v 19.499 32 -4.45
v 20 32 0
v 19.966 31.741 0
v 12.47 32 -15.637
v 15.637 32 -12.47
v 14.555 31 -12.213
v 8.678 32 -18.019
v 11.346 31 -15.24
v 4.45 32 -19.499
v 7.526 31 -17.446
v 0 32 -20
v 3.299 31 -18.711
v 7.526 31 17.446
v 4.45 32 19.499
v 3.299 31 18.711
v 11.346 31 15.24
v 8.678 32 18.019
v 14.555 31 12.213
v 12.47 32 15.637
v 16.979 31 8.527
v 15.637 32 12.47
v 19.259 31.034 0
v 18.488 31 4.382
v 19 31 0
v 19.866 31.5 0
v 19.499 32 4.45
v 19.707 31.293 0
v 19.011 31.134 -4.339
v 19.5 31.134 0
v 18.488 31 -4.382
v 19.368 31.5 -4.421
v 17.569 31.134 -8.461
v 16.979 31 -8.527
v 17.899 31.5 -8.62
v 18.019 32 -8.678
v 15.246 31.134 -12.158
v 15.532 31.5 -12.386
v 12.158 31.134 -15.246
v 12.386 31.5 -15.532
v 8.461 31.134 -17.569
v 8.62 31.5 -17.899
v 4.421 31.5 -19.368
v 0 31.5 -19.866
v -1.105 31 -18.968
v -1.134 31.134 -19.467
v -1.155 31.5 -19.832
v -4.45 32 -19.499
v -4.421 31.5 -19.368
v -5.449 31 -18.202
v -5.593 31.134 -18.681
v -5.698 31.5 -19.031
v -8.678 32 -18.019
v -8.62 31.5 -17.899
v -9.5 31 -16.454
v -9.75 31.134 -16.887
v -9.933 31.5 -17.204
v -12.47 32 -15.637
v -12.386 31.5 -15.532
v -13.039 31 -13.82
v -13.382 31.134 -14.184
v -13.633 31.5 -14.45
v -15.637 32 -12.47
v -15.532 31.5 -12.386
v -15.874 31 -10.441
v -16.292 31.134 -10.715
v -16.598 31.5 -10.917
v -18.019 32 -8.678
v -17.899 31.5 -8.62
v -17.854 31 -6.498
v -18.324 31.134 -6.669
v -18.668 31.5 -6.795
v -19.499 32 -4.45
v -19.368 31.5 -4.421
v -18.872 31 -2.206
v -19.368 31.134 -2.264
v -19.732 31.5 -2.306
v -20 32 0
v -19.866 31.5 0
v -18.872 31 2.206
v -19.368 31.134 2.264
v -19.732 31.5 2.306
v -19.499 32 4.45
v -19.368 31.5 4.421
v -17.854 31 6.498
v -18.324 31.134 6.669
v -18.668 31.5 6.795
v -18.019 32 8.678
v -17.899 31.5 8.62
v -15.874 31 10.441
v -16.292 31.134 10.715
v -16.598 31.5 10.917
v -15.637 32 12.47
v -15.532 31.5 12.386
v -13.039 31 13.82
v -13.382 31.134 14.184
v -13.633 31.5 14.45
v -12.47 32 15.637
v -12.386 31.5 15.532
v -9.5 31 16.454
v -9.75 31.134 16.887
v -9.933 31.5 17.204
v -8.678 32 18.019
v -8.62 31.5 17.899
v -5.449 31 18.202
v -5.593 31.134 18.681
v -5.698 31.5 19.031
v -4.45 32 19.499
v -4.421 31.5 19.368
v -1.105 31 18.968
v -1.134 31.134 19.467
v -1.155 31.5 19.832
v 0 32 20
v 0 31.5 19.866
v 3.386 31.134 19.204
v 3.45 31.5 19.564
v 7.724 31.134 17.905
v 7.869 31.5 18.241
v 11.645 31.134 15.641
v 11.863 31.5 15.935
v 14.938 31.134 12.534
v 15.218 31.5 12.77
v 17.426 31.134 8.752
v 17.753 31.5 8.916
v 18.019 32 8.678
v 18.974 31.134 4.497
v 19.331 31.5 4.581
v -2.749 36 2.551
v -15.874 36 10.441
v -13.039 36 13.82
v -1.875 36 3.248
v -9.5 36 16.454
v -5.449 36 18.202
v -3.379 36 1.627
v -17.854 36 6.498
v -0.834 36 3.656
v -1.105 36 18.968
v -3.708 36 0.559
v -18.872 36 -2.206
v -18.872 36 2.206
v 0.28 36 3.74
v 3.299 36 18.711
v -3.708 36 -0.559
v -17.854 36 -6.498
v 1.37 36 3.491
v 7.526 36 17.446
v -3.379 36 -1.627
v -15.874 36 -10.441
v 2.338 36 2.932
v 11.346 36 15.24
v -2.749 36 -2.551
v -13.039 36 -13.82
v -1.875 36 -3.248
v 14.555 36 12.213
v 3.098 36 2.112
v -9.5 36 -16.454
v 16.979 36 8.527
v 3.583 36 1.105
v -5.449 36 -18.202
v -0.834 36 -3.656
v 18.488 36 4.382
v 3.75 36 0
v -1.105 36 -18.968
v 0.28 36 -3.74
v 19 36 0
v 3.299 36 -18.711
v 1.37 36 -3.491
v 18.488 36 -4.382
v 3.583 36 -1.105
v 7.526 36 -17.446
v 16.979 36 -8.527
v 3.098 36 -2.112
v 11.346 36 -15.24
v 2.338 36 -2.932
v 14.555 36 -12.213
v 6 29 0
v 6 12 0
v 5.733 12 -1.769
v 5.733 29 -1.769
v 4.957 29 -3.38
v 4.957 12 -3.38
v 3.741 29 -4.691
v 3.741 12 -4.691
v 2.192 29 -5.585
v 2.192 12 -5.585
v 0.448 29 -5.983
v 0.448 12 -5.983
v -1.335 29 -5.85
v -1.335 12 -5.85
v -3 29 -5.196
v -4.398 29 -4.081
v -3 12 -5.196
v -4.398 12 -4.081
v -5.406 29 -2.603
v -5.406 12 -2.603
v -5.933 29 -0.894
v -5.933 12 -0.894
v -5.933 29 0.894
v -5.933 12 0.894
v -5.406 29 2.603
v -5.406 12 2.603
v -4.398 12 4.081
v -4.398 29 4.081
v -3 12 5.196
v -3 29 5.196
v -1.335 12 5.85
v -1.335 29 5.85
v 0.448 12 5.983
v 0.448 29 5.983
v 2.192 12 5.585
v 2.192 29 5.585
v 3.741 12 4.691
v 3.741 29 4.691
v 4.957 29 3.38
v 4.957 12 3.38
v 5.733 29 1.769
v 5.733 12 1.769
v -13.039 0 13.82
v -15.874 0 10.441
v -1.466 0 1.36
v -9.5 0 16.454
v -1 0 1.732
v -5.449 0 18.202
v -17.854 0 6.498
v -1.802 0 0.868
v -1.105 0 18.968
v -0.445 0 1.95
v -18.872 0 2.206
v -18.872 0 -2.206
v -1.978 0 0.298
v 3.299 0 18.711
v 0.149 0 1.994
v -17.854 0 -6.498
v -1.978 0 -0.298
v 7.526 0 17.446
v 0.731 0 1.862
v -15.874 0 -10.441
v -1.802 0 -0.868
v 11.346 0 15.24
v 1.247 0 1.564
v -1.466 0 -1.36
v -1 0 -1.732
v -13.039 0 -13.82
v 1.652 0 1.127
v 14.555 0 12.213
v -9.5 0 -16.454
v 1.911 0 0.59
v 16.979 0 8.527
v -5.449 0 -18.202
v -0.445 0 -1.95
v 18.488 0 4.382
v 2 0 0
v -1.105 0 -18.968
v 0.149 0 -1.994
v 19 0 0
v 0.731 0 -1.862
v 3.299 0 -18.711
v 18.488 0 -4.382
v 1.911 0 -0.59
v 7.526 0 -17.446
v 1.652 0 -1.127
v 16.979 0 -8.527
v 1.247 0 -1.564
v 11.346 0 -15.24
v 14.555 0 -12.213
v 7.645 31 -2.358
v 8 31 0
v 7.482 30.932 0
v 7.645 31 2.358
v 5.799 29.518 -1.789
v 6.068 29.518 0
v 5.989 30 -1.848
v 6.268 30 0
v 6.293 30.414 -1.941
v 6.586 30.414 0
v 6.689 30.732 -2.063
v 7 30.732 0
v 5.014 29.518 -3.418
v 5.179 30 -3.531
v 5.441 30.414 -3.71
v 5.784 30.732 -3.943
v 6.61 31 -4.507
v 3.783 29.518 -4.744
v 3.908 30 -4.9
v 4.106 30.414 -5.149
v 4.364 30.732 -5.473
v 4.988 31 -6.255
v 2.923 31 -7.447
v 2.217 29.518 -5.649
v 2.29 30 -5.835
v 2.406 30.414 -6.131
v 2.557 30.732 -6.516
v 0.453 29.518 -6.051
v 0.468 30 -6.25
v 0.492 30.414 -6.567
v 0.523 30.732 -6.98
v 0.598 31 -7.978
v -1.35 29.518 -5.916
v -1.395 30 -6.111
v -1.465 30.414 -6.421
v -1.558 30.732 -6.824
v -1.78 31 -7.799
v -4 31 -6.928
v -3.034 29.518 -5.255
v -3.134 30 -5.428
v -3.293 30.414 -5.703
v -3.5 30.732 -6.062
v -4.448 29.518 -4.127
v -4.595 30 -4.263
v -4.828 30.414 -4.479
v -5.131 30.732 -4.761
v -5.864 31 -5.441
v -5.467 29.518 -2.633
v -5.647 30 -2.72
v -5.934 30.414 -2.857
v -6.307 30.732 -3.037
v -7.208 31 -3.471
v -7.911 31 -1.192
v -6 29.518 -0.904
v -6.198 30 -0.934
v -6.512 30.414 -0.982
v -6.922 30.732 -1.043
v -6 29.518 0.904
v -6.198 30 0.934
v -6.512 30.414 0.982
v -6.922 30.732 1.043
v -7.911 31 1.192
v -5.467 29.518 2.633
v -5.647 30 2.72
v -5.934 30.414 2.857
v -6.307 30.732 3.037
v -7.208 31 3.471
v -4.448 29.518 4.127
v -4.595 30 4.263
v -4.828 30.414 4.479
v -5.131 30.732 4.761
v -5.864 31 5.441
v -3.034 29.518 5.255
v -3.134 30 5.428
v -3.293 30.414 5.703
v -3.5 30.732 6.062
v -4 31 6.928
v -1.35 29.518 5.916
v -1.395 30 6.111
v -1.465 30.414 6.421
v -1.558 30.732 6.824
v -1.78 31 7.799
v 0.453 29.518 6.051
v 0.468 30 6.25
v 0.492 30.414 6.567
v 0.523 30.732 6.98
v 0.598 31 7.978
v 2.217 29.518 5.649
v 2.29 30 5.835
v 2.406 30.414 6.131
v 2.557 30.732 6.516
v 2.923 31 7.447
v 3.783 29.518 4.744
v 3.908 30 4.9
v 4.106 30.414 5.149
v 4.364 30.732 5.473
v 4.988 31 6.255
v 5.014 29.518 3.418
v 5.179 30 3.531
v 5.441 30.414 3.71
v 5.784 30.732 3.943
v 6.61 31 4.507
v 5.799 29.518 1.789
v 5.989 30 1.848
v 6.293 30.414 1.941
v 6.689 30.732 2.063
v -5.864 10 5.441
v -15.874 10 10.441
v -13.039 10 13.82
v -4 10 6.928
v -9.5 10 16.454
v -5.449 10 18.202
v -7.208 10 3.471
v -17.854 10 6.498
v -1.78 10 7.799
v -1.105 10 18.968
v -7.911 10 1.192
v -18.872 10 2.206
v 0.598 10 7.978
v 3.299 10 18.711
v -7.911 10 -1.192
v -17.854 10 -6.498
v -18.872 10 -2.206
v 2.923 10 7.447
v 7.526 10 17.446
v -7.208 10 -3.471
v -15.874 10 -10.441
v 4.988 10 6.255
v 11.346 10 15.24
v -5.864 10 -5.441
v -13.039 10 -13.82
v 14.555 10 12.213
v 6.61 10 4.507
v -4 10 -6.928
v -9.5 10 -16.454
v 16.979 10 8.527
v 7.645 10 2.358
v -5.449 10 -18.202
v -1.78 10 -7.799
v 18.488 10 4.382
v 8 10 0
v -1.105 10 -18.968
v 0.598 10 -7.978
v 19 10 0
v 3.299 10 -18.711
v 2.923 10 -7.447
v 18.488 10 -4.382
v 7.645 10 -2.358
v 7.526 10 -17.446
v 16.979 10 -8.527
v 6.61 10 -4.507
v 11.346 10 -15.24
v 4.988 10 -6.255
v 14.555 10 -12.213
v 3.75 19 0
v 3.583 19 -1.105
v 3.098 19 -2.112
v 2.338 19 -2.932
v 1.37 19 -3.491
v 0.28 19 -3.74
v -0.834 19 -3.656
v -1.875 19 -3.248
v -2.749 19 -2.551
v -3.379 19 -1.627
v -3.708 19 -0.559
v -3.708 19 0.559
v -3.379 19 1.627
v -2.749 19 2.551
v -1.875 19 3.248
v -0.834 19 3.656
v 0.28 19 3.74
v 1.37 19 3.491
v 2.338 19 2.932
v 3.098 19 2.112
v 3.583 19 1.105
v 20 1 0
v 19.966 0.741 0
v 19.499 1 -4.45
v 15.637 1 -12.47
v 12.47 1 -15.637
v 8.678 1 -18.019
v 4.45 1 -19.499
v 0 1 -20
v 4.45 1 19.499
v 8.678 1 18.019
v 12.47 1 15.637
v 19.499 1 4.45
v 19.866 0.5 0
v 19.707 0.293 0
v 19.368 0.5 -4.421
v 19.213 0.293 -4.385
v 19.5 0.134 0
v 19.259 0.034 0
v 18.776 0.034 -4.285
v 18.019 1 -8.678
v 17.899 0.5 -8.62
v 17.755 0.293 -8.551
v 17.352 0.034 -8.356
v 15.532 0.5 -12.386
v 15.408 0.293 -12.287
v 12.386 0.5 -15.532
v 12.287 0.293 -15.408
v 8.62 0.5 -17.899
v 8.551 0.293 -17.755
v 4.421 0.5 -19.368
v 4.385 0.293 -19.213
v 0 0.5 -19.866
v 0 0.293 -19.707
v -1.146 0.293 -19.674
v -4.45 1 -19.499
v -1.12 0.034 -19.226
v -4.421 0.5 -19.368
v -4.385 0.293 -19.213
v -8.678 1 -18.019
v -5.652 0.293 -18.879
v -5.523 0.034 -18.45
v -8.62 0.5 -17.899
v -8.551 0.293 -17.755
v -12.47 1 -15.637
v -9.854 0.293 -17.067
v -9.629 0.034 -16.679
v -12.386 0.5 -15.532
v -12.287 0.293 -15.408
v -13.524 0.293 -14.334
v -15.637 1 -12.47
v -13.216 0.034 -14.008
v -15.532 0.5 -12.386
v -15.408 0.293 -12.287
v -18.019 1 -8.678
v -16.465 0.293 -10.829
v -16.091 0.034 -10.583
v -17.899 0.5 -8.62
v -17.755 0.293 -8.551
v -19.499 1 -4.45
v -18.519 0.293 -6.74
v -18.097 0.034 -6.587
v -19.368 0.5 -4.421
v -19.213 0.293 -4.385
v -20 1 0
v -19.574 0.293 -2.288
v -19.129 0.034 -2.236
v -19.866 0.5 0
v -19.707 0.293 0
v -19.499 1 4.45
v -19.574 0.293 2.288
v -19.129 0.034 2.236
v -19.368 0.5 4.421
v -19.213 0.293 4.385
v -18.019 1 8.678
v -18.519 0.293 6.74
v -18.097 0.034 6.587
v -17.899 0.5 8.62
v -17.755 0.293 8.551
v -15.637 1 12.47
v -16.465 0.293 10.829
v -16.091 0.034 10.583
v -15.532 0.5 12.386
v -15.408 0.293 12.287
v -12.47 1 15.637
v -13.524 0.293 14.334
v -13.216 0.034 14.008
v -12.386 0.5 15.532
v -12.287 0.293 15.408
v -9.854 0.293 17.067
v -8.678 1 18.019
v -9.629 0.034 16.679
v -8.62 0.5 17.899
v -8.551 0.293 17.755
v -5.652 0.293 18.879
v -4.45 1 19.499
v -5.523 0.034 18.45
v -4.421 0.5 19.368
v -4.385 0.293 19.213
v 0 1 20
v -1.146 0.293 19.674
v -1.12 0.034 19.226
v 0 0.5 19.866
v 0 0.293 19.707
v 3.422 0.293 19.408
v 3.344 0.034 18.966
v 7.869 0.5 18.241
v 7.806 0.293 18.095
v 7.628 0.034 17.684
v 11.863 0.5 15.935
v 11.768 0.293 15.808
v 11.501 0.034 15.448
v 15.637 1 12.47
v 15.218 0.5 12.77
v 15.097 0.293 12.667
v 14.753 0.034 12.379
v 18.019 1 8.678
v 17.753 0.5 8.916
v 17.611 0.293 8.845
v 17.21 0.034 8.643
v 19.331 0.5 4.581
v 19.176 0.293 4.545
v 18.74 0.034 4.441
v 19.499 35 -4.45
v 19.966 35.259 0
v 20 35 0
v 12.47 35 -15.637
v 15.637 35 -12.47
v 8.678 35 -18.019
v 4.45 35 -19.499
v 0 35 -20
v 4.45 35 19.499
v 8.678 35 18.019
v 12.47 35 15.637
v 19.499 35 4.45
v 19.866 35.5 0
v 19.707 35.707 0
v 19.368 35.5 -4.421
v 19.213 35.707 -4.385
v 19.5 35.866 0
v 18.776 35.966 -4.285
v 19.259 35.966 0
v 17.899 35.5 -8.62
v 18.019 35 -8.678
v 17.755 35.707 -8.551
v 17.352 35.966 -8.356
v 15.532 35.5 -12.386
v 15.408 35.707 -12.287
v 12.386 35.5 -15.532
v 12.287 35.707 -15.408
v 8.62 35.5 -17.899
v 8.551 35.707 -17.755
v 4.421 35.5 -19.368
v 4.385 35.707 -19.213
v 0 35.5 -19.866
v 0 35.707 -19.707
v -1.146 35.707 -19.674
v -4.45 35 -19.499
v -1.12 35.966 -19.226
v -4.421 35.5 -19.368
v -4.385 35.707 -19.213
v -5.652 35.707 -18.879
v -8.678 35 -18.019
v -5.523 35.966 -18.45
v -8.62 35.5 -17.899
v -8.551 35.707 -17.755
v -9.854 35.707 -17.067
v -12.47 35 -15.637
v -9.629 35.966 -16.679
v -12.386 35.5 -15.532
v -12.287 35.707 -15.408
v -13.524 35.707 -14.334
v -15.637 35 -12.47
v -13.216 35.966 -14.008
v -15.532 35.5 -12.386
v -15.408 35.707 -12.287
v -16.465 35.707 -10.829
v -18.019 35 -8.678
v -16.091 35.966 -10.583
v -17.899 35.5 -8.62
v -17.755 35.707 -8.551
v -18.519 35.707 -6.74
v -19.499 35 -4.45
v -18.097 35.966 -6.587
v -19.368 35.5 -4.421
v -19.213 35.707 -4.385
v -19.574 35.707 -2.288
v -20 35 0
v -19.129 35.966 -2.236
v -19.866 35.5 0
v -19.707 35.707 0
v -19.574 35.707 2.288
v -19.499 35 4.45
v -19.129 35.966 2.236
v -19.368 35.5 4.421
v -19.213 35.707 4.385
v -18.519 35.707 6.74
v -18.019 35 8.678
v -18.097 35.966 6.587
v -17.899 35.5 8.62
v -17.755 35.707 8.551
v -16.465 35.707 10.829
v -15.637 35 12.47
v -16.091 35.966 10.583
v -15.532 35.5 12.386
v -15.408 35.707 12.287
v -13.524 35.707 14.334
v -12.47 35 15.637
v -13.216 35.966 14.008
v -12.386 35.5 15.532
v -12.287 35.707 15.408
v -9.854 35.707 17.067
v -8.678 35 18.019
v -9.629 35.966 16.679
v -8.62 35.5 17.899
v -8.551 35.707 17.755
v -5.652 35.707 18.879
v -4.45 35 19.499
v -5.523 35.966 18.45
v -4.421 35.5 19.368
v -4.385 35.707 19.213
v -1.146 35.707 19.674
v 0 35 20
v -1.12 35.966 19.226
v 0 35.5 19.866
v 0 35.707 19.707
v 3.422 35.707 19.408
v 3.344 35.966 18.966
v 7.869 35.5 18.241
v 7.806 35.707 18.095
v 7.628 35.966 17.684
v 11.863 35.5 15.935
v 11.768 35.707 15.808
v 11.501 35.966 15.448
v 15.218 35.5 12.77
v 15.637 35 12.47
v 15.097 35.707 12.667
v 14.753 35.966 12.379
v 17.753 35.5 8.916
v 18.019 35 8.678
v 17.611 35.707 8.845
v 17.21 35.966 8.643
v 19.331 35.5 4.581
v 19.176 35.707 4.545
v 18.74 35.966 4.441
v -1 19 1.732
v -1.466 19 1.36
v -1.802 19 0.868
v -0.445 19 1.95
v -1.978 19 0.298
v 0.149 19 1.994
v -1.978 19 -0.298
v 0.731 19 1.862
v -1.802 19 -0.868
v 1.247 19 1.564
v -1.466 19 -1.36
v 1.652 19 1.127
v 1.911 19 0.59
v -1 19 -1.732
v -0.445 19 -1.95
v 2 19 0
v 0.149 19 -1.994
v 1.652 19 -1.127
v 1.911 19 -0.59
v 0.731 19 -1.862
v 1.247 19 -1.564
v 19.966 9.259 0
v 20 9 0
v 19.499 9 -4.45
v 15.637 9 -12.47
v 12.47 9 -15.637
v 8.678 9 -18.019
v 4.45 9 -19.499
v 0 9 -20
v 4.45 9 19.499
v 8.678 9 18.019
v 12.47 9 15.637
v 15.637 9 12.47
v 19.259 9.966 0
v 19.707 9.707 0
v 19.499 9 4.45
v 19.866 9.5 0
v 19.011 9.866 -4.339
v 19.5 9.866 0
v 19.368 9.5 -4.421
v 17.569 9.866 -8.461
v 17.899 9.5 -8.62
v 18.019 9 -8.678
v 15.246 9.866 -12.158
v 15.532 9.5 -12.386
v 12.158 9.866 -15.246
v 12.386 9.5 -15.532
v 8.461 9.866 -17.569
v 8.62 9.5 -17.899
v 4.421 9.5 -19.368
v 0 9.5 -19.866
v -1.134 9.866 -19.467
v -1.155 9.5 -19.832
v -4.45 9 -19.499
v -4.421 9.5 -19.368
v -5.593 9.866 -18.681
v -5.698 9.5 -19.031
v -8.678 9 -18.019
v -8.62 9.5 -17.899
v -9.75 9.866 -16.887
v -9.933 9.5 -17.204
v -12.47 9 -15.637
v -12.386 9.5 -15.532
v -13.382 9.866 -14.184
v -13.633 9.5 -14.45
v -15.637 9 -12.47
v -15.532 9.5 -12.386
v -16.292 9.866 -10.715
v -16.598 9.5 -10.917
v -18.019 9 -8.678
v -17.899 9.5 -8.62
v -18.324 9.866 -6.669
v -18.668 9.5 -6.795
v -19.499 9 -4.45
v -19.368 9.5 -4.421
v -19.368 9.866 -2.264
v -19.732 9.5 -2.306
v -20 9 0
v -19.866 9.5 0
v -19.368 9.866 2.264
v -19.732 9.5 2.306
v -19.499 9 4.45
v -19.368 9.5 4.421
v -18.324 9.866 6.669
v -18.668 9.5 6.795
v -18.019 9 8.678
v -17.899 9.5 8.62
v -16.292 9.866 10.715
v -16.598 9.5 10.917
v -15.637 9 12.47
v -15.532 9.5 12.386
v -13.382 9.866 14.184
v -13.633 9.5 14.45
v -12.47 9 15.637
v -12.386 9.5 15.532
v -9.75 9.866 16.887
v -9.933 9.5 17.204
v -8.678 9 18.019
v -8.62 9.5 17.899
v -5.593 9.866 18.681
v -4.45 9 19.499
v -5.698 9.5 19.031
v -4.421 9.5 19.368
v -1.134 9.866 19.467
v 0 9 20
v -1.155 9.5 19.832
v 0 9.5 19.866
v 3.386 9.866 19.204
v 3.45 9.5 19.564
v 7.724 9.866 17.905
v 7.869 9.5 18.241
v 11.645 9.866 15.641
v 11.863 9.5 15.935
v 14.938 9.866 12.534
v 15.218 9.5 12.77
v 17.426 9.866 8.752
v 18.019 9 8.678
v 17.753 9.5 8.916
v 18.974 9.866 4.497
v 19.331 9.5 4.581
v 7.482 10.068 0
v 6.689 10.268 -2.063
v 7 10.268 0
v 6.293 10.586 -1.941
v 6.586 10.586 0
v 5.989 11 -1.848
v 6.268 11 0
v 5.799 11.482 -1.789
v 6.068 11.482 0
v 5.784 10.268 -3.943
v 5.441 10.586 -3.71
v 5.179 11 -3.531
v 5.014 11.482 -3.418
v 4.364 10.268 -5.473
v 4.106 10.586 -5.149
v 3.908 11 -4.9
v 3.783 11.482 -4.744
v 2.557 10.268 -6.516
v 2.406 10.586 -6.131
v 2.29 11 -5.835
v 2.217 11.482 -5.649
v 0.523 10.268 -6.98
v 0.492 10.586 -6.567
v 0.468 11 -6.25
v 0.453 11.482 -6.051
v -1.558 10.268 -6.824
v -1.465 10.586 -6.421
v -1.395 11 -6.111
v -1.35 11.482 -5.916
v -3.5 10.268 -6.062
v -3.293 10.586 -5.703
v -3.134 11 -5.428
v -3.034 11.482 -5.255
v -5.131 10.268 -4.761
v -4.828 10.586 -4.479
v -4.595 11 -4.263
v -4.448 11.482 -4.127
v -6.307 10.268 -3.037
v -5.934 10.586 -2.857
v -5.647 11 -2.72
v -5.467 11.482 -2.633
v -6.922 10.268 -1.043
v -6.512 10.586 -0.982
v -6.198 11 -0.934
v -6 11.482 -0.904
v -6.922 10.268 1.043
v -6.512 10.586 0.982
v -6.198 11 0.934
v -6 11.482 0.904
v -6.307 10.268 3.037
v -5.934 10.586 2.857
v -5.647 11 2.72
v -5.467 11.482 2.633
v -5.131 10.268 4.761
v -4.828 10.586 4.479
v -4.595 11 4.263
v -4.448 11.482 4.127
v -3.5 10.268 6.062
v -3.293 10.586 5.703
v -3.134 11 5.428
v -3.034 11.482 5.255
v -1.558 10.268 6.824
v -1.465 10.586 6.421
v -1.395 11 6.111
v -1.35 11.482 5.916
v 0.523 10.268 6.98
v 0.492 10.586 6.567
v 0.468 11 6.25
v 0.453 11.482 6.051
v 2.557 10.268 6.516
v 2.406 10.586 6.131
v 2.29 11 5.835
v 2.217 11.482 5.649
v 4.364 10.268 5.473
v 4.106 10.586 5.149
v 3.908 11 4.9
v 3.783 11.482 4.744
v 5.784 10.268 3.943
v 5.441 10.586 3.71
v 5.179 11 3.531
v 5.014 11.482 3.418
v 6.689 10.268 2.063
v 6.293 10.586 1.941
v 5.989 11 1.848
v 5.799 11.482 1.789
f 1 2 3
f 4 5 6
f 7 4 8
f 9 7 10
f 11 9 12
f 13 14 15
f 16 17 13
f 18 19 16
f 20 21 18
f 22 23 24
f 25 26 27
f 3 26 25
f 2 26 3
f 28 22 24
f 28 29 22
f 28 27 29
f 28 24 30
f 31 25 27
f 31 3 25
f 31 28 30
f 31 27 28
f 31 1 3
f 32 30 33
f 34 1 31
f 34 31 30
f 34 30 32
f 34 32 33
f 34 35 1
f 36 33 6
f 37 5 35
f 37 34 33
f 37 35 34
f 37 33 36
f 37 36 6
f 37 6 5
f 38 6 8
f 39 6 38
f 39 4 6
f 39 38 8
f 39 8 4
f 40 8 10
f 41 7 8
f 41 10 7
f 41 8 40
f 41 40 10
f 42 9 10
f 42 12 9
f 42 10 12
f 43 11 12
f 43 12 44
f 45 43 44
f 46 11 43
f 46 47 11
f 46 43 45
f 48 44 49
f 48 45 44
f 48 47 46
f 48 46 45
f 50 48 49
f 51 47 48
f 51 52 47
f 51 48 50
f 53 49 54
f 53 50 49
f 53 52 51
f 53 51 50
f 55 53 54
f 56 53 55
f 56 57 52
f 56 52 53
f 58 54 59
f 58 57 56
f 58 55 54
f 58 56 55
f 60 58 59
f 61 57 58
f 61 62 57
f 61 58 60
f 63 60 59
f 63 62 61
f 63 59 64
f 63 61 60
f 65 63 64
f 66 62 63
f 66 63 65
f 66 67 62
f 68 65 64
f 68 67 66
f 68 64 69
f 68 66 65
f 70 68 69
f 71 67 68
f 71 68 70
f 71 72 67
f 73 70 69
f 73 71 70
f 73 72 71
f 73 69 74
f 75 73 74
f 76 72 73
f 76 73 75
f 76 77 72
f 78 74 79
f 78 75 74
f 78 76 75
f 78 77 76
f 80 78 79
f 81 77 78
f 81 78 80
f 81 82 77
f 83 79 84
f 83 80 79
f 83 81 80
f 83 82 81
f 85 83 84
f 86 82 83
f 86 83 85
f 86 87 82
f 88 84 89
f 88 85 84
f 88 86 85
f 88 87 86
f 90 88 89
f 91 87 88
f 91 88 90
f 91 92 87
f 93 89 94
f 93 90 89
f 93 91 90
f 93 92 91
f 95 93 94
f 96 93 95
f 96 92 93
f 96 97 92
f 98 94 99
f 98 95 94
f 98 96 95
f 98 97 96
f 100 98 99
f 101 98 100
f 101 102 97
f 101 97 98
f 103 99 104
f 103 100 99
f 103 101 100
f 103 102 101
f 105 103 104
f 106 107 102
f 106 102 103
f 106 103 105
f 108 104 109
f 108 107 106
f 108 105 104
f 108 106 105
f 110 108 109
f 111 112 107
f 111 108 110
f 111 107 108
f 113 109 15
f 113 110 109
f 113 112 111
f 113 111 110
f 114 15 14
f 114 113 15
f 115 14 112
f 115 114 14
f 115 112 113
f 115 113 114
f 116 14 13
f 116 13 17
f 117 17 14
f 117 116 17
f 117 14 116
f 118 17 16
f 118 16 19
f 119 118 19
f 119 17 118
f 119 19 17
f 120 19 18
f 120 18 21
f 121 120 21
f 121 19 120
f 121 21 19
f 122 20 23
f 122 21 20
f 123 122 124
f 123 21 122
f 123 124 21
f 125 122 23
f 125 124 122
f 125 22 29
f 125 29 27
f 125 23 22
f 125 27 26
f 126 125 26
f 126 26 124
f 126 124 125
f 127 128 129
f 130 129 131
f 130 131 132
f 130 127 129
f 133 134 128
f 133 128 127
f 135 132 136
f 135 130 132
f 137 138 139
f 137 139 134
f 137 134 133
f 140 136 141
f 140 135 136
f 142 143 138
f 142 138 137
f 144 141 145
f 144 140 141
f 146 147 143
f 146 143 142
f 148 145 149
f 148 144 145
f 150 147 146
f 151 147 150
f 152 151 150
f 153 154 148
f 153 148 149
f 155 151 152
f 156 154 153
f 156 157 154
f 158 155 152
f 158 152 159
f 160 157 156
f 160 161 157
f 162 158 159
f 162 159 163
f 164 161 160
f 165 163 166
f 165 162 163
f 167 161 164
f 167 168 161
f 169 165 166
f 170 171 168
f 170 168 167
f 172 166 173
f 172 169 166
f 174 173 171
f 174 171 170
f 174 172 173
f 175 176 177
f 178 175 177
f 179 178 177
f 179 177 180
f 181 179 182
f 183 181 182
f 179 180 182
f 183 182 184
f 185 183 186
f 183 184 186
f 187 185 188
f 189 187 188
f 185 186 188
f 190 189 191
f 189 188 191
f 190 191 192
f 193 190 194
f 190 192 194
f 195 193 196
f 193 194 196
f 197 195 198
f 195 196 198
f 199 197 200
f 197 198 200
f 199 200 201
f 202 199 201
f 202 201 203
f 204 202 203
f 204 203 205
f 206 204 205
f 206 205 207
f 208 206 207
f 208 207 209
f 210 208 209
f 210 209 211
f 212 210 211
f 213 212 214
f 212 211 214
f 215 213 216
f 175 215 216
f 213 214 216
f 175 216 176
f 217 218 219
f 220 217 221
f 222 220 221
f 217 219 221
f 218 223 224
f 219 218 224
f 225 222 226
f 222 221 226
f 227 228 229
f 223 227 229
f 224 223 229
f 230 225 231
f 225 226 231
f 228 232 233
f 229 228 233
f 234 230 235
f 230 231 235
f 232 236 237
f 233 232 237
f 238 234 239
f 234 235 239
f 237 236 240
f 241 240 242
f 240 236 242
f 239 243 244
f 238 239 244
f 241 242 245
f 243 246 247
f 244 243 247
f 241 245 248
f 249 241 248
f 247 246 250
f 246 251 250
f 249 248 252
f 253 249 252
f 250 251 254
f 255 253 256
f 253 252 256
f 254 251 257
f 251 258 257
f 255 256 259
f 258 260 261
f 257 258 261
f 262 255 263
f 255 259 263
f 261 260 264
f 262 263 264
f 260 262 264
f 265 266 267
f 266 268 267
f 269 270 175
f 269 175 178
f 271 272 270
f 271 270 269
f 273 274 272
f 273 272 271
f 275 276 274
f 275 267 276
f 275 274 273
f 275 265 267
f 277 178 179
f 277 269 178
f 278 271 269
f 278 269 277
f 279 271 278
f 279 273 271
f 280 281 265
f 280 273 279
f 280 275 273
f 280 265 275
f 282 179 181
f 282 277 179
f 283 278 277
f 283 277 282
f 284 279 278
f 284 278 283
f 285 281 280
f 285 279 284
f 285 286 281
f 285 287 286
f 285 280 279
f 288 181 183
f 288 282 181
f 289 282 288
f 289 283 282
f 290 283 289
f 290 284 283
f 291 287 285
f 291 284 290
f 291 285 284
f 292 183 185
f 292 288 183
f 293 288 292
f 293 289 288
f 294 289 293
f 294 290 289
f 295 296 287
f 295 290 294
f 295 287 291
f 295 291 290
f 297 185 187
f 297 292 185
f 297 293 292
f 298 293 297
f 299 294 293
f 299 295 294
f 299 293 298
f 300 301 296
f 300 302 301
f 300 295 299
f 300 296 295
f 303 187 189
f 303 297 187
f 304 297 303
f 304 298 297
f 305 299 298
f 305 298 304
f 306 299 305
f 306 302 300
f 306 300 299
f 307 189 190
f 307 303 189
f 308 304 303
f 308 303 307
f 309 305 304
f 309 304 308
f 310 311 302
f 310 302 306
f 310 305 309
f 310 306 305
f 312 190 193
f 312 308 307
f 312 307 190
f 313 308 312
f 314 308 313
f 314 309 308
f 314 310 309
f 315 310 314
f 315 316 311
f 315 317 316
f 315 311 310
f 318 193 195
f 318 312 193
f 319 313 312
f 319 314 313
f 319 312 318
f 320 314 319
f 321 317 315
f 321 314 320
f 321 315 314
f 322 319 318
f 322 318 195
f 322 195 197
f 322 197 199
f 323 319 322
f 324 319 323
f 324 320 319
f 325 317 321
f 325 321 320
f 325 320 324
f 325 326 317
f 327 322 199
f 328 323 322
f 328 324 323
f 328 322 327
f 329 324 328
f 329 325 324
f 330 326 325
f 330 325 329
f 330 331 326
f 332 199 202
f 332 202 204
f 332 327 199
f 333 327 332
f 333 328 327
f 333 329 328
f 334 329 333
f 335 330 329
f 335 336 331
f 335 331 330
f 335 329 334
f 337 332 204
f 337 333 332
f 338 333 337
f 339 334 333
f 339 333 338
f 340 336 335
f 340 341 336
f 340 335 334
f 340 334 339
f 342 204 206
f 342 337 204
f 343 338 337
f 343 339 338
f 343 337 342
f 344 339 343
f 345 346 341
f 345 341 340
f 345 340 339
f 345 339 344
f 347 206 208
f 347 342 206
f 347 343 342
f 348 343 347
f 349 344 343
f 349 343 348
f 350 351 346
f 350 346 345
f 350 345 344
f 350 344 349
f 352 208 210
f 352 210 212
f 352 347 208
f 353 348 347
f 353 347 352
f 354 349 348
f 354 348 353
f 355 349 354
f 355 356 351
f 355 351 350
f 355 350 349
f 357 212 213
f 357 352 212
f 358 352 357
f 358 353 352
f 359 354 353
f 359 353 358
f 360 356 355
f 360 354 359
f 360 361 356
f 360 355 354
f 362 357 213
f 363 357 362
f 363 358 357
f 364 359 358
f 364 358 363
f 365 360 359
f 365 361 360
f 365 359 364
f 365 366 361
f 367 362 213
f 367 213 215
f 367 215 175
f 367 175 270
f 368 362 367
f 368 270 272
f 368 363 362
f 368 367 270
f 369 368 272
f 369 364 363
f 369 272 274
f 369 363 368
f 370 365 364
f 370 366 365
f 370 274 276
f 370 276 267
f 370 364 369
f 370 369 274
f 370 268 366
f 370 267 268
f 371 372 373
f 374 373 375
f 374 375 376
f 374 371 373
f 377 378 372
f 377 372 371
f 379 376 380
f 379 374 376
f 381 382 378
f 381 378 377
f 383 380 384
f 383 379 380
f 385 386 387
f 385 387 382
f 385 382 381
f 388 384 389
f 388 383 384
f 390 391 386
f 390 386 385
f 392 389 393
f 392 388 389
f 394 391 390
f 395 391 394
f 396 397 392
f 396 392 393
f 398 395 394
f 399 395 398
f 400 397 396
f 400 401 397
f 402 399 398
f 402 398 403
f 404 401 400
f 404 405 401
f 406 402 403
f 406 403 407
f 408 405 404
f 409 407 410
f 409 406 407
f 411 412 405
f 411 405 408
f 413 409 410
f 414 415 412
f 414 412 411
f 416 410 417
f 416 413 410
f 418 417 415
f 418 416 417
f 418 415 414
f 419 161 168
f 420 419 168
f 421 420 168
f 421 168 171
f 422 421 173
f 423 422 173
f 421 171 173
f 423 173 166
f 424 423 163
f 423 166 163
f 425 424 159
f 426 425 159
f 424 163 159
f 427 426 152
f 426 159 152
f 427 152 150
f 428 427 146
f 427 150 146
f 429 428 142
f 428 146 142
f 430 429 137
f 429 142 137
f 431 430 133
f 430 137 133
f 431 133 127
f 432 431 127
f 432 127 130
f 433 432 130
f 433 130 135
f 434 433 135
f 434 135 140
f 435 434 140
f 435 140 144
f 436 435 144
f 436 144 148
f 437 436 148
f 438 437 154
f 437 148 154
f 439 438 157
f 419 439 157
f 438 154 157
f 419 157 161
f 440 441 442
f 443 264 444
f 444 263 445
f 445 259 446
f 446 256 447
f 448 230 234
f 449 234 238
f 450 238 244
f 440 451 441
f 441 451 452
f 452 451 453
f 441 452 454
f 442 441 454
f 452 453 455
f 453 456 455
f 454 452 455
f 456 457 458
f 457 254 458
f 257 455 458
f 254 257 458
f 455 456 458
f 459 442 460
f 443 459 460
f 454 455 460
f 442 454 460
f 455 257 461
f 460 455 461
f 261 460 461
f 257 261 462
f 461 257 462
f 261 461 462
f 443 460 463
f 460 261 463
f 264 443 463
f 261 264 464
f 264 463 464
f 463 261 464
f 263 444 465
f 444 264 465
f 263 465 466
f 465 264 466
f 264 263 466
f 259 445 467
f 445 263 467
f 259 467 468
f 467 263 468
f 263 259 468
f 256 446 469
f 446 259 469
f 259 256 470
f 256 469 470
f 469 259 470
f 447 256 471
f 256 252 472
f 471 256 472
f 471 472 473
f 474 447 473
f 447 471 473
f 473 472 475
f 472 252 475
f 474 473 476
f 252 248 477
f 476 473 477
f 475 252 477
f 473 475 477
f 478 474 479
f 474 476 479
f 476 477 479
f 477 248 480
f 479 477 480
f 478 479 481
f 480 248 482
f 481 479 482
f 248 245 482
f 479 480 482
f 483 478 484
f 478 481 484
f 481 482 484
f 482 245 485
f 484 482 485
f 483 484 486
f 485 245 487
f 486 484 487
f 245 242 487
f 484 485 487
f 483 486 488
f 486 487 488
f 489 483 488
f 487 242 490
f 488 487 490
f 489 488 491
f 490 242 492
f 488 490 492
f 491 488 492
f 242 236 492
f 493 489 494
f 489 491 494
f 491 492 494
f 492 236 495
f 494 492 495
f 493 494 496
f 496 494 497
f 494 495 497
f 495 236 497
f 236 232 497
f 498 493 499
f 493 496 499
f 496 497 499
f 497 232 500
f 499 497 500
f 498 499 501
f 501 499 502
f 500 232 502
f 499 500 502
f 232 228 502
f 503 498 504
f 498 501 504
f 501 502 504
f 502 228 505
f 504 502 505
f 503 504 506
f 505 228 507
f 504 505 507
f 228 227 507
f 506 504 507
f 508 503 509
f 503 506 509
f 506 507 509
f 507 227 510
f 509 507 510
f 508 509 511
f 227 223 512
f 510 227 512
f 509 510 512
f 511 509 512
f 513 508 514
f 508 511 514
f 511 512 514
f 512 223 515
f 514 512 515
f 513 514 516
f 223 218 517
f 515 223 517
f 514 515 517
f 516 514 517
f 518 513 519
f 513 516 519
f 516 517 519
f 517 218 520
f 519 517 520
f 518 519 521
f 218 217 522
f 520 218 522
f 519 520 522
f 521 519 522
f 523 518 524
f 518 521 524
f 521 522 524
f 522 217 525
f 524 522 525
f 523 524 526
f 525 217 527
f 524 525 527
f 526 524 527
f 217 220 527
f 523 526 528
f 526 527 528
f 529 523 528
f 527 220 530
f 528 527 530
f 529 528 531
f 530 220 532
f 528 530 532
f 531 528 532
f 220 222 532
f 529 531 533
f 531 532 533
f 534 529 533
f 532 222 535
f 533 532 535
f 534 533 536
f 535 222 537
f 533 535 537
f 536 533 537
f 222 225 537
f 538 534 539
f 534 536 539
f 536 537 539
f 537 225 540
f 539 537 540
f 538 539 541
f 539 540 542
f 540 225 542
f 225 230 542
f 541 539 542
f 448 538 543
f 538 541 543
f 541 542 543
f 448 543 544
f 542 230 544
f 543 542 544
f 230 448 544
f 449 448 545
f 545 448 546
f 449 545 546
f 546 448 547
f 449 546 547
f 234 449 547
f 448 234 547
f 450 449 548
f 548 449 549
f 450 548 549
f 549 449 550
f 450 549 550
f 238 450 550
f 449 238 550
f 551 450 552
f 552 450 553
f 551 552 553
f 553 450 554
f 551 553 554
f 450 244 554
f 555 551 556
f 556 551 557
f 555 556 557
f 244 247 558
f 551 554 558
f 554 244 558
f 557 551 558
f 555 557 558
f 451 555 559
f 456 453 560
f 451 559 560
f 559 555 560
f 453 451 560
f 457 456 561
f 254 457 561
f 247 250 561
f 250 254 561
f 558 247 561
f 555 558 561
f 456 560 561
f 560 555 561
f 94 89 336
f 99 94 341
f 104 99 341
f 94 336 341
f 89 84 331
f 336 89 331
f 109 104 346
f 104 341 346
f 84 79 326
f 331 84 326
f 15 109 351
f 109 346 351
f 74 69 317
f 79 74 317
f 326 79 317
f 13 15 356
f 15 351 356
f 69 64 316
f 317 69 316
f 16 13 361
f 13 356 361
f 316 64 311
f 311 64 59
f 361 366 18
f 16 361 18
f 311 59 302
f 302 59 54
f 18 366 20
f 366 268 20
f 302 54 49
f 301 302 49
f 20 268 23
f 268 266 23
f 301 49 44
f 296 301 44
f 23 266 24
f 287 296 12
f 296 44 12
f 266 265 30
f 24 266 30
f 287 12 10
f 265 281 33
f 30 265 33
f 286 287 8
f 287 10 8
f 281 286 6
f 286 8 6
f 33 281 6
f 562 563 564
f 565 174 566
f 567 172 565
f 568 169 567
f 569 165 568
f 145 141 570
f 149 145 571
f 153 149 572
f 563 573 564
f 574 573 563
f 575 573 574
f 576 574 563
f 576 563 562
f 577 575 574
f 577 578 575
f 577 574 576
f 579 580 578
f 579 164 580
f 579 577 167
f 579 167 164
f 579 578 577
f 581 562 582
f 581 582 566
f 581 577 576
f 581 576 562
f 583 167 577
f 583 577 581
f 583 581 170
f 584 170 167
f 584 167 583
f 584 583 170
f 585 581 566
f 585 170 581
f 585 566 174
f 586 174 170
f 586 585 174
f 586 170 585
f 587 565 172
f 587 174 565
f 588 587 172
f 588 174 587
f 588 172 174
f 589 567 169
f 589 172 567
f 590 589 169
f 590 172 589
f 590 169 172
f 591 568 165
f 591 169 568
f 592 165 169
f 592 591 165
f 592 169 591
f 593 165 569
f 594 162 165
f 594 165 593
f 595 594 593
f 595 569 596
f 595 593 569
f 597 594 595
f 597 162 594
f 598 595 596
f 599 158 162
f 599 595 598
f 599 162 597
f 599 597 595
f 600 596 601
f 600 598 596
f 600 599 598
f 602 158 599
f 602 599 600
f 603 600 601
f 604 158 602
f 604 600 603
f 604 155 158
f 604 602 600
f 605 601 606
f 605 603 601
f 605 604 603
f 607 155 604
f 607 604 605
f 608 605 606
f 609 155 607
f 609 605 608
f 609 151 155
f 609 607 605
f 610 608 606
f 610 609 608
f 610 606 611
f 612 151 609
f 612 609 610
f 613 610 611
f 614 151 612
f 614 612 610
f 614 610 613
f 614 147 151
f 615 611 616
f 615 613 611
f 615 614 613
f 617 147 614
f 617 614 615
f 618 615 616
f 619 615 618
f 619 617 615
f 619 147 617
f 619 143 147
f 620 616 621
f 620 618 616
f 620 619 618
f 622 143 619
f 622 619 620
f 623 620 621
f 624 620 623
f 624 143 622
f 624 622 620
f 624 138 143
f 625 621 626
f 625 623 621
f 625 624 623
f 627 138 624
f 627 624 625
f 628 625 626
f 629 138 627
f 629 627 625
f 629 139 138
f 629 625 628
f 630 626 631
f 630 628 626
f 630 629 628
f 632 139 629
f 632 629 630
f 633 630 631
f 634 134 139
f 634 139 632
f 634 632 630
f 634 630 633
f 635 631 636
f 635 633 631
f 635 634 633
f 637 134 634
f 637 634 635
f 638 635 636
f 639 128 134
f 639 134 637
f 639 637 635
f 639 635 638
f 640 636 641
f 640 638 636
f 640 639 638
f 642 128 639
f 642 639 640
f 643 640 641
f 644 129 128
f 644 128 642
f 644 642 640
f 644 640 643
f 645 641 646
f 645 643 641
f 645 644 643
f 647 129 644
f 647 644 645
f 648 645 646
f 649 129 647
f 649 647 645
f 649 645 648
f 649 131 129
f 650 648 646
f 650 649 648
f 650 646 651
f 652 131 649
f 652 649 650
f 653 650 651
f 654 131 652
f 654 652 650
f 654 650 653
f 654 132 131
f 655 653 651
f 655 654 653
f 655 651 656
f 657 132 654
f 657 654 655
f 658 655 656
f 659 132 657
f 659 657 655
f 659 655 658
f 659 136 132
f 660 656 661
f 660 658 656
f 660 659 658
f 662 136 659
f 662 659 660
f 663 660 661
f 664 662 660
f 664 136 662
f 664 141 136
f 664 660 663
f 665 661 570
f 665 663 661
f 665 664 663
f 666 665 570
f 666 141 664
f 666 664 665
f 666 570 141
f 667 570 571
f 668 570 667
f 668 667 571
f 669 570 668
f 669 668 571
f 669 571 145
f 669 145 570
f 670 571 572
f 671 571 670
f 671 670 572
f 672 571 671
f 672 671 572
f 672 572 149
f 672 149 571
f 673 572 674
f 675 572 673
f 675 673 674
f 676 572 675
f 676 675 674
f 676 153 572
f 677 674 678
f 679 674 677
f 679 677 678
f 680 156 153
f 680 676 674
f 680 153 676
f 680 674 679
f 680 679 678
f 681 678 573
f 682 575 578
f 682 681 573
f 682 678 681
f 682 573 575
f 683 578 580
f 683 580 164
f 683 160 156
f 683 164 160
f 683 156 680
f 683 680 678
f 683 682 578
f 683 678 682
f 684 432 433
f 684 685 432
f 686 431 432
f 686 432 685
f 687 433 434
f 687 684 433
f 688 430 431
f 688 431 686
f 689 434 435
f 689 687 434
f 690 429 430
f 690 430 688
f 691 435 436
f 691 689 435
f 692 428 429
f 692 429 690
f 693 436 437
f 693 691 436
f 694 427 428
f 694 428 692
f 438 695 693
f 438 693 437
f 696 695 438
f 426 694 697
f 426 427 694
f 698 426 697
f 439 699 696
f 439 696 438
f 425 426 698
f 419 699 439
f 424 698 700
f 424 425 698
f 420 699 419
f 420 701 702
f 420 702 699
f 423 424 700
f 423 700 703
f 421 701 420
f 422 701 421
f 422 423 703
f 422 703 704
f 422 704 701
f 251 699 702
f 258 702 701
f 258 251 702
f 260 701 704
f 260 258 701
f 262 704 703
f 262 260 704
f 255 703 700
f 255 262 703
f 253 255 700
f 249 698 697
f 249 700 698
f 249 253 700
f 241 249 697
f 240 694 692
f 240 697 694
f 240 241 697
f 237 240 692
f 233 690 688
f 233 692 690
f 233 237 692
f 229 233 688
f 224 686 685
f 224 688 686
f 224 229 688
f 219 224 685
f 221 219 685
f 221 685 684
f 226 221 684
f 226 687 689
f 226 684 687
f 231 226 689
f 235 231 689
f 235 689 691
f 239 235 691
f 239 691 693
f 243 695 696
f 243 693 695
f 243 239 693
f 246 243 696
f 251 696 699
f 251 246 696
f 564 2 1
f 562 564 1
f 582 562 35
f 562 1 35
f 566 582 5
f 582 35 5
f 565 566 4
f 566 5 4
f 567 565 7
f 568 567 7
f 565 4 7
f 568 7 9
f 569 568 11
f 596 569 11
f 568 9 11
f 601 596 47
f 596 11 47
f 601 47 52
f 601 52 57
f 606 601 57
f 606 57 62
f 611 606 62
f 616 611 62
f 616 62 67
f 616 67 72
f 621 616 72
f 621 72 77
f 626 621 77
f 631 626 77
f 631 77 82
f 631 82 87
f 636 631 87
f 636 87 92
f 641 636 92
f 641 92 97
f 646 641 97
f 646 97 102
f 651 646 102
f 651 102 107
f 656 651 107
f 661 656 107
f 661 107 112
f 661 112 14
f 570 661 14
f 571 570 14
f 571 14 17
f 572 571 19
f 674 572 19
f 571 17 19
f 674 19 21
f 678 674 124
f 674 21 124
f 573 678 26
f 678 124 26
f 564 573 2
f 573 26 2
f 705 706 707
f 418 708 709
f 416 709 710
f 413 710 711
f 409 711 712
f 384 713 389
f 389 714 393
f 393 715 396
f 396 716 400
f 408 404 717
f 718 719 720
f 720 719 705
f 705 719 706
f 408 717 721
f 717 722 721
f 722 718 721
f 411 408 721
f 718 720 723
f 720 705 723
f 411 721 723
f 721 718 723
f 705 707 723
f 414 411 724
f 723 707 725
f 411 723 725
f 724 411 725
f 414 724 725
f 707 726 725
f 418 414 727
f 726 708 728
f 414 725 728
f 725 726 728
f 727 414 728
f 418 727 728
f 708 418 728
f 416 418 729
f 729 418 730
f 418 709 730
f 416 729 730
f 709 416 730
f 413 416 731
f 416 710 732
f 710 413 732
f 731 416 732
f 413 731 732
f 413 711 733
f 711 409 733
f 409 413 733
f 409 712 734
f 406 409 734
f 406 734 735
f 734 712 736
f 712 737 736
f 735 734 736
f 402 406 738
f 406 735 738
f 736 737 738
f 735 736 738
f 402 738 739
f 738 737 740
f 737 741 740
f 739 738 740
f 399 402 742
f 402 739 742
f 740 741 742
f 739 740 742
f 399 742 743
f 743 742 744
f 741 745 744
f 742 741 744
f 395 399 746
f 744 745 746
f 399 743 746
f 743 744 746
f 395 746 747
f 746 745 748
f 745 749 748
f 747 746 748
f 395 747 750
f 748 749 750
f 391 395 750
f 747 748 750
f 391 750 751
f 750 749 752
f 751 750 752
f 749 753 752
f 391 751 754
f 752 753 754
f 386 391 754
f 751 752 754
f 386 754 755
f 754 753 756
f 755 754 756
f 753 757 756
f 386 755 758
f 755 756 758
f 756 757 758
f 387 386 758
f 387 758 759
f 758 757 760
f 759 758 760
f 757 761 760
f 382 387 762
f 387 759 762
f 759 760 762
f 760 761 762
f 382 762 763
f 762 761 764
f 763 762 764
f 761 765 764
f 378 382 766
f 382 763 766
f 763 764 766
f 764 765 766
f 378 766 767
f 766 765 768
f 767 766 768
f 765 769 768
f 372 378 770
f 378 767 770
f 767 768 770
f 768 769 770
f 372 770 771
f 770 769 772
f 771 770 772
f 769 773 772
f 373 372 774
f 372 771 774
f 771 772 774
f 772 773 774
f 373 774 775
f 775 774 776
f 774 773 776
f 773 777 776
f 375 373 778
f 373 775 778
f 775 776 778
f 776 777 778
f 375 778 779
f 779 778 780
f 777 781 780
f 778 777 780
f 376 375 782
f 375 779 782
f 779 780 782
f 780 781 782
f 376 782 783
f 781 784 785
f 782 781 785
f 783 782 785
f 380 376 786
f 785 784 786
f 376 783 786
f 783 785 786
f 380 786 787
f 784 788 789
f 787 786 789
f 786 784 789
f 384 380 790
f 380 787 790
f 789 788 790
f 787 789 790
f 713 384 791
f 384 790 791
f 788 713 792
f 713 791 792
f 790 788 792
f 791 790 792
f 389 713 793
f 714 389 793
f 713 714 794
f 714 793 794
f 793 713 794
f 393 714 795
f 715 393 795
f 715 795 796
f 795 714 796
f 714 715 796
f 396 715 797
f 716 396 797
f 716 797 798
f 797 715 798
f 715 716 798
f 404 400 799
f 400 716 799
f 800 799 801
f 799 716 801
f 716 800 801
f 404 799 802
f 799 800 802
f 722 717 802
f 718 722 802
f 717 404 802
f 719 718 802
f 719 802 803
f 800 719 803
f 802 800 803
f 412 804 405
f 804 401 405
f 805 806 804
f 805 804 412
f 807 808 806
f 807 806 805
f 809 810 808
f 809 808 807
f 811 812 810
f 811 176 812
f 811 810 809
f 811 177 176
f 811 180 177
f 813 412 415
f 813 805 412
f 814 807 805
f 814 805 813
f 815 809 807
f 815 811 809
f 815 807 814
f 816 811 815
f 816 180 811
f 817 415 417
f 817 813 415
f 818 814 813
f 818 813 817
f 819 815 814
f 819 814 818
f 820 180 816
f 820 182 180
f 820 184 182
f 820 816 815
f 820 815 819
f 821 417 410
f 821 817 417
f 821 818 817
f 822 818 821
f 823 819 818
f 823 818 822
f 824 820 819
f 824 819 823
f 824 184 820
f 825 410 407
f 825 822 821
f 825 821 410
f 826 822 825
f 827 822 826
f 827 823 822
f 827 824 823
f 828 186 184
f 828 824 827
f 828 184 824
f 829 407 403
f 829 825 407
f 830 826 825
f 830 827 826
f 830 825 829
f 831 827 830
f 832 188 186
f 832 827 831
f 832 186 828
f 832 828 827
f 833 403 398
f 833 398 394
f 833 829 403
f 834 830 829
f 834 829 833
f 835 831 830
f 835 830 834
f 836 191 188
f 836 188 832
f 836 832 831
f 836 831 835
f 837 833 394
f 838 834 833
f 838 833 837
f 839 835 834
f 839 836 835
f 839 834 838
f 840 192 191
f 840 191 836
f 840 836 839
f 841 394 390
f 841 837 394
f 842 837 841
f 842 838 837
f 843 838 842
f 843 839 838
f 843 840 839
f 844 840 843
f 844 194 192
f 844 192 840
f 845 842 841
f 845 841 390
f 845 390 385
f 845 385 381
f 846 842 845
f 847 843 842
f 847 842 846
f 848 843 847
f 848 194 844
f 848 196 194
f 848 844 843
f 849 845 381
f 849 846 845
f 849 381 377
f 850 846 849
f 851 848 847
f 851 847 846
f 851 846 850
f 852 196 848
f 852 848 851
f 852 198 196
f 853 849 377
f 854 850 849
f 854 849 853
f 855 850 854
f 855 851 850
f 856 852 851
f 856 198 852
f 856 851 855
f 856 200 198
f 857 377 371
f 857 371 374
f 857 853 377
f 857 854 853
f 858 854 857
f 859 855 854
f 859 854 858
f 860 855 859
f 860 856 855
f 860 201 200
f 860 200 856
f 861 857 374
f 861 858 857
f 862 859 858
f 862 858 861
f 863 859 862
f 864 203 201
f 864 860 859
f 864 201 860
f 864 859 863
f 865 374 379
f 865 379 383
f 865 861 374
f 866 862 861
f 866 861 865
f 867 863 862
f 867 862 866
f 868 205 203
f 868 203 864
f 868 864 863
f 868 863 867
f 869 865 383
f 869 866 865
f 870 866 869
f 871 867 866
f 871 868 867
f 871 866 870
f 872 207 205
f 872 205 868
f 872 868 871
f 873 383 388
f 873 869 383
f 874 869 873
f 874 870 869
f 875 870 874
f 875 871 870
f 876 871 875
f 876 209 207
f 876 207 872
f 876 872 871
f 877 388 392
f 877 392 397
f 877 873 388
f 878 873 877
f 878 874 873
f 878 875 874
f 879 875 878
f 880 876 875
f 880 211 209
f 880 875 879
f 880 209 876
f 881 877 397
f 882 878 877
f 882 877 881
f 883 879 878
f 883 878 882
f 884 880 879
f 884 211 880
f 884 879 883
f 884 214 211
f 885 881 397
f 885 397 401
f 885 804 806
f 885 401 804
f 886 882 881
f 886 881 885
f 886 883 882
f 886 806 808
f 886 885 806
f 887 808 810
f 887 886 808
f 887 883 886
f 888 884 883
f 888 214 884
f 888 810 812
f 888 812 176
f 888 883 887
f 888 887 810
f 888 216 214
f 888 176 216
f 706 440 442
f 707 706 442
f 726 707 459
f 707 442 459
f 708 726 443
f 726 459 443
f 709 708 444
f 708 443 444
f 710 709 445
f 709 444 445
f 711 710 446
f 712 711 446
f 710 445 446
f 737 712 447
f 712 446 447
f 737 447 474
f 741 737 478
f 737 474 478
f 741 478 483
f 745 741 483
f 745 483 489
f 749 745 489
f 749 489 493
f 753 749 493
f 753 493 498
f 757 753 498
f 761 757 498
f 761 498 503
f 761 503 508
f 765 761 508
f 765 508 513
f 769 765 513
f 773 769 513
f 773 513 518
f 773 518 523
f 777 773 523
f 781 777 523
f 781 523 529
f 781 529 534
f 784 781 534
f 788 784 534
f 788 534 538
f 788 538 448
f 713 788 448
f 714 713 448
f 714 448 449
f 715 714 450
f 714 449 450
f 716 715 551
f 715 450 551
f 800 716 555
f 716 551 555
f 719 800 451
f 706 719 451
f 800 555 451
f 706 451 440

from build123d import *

# Parameters (mm, degrees)
SKETCH_1_R               = 20
EXTRUDE_1_DEPTH          = 36
CUT_EXTRUDE_START        = 10
SKETCH_2_R               = 20
SKETCH_2_R_2             = 6
CUT_EXTRUDE_1_DEPTH      = 21
SKETCH_4_R               = 2
CUT_EXTRUDE_3_DEPTH      = 47
CUT_EXTRUDE_3_DEPTH_BACK = 47
SKETCH_3_R               = 3.75
CUT_EXTRUDE_7_DEPTH      = 17
FILLET_1_R               = 2
FILLET_2_R               = 1


with BuildPart() as part:
    # 草图1 → 凸台-拉伸1 (new body)
    with BuildSketch(Plane(origin=(0, 0, 0), x_dir=(1, 0, 0), z_dir=(0, 1, 0))):
        Circle(SKETCH_1_R)
    extrude(amount=EXTRUDE_1_DEPTH)

    # 草图2 → 切除-拉伸1 (cut)
    with BuildSketch(Plane(origin=(0, 0, 0), x_dir=(1, 0, 0), z_dir=(0, 1, 0)).offset(CUT_EXTRUDE_START)):
        Circle(SKETCH_2_R)
        Circle(SKETCH_2_R_2, mode=Mode.SUBTRACT)
    extrude(amount=CUT_EXTRUDE_1_DEPTH, mode=Mode.SUBTRACT)

    # 草图4 → 切除-拉伸3 (cut, two sides)
    with BuildSketch(Plane(origin=(0, 0, 0), x_dir=(1, 0, 0), z_dir=(0, 1, 0))) as cut_extrude_3_sk:
        Circle(SKETCH_4_R)
    extrude(amount=CUT_EXTRUDE_3_DEPTH, mode=Mode.SUBTRACT)
    extrude(cut_extrude_3_sk.sketch, amount=-CUT_EXTRUDE_3_DEPTH_BACK, mode=Mode.SUBTRACT)

    # 草图3 → 切除-拉伸7 (cut)
    with BuildSketch(Plane(origin=(0, 36, 0), x_dir=(1, 0, 0), z_dir=(0, 1, 0))):
        Circle(SKETCH_3_R)
    extrude(amount=-CUT_EXTRUDE_7_DEPTH, mode=Mode.SUBTRACT)

    # 圆角1
    fillet_1_edges = [part.edges().sort_by_distance(p)[0] for p in [
        (-6, 31, 0),
        (-6, 10, 0),
    ]]
    fillet(fillet_1_edges, radius=FILLET_1_R)

    # 圆角2
    fillet_2_edges = [part.edges().sort_by_distance(p)[0] for p in [
        (-20, 0, 0),
        (-20, 36, 0),
        (-20, 10, 0),
        (-20, 31, 0),
    ]]
    fillet(fillet_2_edges, radius=FILLET_2_R)


solid = part.part
